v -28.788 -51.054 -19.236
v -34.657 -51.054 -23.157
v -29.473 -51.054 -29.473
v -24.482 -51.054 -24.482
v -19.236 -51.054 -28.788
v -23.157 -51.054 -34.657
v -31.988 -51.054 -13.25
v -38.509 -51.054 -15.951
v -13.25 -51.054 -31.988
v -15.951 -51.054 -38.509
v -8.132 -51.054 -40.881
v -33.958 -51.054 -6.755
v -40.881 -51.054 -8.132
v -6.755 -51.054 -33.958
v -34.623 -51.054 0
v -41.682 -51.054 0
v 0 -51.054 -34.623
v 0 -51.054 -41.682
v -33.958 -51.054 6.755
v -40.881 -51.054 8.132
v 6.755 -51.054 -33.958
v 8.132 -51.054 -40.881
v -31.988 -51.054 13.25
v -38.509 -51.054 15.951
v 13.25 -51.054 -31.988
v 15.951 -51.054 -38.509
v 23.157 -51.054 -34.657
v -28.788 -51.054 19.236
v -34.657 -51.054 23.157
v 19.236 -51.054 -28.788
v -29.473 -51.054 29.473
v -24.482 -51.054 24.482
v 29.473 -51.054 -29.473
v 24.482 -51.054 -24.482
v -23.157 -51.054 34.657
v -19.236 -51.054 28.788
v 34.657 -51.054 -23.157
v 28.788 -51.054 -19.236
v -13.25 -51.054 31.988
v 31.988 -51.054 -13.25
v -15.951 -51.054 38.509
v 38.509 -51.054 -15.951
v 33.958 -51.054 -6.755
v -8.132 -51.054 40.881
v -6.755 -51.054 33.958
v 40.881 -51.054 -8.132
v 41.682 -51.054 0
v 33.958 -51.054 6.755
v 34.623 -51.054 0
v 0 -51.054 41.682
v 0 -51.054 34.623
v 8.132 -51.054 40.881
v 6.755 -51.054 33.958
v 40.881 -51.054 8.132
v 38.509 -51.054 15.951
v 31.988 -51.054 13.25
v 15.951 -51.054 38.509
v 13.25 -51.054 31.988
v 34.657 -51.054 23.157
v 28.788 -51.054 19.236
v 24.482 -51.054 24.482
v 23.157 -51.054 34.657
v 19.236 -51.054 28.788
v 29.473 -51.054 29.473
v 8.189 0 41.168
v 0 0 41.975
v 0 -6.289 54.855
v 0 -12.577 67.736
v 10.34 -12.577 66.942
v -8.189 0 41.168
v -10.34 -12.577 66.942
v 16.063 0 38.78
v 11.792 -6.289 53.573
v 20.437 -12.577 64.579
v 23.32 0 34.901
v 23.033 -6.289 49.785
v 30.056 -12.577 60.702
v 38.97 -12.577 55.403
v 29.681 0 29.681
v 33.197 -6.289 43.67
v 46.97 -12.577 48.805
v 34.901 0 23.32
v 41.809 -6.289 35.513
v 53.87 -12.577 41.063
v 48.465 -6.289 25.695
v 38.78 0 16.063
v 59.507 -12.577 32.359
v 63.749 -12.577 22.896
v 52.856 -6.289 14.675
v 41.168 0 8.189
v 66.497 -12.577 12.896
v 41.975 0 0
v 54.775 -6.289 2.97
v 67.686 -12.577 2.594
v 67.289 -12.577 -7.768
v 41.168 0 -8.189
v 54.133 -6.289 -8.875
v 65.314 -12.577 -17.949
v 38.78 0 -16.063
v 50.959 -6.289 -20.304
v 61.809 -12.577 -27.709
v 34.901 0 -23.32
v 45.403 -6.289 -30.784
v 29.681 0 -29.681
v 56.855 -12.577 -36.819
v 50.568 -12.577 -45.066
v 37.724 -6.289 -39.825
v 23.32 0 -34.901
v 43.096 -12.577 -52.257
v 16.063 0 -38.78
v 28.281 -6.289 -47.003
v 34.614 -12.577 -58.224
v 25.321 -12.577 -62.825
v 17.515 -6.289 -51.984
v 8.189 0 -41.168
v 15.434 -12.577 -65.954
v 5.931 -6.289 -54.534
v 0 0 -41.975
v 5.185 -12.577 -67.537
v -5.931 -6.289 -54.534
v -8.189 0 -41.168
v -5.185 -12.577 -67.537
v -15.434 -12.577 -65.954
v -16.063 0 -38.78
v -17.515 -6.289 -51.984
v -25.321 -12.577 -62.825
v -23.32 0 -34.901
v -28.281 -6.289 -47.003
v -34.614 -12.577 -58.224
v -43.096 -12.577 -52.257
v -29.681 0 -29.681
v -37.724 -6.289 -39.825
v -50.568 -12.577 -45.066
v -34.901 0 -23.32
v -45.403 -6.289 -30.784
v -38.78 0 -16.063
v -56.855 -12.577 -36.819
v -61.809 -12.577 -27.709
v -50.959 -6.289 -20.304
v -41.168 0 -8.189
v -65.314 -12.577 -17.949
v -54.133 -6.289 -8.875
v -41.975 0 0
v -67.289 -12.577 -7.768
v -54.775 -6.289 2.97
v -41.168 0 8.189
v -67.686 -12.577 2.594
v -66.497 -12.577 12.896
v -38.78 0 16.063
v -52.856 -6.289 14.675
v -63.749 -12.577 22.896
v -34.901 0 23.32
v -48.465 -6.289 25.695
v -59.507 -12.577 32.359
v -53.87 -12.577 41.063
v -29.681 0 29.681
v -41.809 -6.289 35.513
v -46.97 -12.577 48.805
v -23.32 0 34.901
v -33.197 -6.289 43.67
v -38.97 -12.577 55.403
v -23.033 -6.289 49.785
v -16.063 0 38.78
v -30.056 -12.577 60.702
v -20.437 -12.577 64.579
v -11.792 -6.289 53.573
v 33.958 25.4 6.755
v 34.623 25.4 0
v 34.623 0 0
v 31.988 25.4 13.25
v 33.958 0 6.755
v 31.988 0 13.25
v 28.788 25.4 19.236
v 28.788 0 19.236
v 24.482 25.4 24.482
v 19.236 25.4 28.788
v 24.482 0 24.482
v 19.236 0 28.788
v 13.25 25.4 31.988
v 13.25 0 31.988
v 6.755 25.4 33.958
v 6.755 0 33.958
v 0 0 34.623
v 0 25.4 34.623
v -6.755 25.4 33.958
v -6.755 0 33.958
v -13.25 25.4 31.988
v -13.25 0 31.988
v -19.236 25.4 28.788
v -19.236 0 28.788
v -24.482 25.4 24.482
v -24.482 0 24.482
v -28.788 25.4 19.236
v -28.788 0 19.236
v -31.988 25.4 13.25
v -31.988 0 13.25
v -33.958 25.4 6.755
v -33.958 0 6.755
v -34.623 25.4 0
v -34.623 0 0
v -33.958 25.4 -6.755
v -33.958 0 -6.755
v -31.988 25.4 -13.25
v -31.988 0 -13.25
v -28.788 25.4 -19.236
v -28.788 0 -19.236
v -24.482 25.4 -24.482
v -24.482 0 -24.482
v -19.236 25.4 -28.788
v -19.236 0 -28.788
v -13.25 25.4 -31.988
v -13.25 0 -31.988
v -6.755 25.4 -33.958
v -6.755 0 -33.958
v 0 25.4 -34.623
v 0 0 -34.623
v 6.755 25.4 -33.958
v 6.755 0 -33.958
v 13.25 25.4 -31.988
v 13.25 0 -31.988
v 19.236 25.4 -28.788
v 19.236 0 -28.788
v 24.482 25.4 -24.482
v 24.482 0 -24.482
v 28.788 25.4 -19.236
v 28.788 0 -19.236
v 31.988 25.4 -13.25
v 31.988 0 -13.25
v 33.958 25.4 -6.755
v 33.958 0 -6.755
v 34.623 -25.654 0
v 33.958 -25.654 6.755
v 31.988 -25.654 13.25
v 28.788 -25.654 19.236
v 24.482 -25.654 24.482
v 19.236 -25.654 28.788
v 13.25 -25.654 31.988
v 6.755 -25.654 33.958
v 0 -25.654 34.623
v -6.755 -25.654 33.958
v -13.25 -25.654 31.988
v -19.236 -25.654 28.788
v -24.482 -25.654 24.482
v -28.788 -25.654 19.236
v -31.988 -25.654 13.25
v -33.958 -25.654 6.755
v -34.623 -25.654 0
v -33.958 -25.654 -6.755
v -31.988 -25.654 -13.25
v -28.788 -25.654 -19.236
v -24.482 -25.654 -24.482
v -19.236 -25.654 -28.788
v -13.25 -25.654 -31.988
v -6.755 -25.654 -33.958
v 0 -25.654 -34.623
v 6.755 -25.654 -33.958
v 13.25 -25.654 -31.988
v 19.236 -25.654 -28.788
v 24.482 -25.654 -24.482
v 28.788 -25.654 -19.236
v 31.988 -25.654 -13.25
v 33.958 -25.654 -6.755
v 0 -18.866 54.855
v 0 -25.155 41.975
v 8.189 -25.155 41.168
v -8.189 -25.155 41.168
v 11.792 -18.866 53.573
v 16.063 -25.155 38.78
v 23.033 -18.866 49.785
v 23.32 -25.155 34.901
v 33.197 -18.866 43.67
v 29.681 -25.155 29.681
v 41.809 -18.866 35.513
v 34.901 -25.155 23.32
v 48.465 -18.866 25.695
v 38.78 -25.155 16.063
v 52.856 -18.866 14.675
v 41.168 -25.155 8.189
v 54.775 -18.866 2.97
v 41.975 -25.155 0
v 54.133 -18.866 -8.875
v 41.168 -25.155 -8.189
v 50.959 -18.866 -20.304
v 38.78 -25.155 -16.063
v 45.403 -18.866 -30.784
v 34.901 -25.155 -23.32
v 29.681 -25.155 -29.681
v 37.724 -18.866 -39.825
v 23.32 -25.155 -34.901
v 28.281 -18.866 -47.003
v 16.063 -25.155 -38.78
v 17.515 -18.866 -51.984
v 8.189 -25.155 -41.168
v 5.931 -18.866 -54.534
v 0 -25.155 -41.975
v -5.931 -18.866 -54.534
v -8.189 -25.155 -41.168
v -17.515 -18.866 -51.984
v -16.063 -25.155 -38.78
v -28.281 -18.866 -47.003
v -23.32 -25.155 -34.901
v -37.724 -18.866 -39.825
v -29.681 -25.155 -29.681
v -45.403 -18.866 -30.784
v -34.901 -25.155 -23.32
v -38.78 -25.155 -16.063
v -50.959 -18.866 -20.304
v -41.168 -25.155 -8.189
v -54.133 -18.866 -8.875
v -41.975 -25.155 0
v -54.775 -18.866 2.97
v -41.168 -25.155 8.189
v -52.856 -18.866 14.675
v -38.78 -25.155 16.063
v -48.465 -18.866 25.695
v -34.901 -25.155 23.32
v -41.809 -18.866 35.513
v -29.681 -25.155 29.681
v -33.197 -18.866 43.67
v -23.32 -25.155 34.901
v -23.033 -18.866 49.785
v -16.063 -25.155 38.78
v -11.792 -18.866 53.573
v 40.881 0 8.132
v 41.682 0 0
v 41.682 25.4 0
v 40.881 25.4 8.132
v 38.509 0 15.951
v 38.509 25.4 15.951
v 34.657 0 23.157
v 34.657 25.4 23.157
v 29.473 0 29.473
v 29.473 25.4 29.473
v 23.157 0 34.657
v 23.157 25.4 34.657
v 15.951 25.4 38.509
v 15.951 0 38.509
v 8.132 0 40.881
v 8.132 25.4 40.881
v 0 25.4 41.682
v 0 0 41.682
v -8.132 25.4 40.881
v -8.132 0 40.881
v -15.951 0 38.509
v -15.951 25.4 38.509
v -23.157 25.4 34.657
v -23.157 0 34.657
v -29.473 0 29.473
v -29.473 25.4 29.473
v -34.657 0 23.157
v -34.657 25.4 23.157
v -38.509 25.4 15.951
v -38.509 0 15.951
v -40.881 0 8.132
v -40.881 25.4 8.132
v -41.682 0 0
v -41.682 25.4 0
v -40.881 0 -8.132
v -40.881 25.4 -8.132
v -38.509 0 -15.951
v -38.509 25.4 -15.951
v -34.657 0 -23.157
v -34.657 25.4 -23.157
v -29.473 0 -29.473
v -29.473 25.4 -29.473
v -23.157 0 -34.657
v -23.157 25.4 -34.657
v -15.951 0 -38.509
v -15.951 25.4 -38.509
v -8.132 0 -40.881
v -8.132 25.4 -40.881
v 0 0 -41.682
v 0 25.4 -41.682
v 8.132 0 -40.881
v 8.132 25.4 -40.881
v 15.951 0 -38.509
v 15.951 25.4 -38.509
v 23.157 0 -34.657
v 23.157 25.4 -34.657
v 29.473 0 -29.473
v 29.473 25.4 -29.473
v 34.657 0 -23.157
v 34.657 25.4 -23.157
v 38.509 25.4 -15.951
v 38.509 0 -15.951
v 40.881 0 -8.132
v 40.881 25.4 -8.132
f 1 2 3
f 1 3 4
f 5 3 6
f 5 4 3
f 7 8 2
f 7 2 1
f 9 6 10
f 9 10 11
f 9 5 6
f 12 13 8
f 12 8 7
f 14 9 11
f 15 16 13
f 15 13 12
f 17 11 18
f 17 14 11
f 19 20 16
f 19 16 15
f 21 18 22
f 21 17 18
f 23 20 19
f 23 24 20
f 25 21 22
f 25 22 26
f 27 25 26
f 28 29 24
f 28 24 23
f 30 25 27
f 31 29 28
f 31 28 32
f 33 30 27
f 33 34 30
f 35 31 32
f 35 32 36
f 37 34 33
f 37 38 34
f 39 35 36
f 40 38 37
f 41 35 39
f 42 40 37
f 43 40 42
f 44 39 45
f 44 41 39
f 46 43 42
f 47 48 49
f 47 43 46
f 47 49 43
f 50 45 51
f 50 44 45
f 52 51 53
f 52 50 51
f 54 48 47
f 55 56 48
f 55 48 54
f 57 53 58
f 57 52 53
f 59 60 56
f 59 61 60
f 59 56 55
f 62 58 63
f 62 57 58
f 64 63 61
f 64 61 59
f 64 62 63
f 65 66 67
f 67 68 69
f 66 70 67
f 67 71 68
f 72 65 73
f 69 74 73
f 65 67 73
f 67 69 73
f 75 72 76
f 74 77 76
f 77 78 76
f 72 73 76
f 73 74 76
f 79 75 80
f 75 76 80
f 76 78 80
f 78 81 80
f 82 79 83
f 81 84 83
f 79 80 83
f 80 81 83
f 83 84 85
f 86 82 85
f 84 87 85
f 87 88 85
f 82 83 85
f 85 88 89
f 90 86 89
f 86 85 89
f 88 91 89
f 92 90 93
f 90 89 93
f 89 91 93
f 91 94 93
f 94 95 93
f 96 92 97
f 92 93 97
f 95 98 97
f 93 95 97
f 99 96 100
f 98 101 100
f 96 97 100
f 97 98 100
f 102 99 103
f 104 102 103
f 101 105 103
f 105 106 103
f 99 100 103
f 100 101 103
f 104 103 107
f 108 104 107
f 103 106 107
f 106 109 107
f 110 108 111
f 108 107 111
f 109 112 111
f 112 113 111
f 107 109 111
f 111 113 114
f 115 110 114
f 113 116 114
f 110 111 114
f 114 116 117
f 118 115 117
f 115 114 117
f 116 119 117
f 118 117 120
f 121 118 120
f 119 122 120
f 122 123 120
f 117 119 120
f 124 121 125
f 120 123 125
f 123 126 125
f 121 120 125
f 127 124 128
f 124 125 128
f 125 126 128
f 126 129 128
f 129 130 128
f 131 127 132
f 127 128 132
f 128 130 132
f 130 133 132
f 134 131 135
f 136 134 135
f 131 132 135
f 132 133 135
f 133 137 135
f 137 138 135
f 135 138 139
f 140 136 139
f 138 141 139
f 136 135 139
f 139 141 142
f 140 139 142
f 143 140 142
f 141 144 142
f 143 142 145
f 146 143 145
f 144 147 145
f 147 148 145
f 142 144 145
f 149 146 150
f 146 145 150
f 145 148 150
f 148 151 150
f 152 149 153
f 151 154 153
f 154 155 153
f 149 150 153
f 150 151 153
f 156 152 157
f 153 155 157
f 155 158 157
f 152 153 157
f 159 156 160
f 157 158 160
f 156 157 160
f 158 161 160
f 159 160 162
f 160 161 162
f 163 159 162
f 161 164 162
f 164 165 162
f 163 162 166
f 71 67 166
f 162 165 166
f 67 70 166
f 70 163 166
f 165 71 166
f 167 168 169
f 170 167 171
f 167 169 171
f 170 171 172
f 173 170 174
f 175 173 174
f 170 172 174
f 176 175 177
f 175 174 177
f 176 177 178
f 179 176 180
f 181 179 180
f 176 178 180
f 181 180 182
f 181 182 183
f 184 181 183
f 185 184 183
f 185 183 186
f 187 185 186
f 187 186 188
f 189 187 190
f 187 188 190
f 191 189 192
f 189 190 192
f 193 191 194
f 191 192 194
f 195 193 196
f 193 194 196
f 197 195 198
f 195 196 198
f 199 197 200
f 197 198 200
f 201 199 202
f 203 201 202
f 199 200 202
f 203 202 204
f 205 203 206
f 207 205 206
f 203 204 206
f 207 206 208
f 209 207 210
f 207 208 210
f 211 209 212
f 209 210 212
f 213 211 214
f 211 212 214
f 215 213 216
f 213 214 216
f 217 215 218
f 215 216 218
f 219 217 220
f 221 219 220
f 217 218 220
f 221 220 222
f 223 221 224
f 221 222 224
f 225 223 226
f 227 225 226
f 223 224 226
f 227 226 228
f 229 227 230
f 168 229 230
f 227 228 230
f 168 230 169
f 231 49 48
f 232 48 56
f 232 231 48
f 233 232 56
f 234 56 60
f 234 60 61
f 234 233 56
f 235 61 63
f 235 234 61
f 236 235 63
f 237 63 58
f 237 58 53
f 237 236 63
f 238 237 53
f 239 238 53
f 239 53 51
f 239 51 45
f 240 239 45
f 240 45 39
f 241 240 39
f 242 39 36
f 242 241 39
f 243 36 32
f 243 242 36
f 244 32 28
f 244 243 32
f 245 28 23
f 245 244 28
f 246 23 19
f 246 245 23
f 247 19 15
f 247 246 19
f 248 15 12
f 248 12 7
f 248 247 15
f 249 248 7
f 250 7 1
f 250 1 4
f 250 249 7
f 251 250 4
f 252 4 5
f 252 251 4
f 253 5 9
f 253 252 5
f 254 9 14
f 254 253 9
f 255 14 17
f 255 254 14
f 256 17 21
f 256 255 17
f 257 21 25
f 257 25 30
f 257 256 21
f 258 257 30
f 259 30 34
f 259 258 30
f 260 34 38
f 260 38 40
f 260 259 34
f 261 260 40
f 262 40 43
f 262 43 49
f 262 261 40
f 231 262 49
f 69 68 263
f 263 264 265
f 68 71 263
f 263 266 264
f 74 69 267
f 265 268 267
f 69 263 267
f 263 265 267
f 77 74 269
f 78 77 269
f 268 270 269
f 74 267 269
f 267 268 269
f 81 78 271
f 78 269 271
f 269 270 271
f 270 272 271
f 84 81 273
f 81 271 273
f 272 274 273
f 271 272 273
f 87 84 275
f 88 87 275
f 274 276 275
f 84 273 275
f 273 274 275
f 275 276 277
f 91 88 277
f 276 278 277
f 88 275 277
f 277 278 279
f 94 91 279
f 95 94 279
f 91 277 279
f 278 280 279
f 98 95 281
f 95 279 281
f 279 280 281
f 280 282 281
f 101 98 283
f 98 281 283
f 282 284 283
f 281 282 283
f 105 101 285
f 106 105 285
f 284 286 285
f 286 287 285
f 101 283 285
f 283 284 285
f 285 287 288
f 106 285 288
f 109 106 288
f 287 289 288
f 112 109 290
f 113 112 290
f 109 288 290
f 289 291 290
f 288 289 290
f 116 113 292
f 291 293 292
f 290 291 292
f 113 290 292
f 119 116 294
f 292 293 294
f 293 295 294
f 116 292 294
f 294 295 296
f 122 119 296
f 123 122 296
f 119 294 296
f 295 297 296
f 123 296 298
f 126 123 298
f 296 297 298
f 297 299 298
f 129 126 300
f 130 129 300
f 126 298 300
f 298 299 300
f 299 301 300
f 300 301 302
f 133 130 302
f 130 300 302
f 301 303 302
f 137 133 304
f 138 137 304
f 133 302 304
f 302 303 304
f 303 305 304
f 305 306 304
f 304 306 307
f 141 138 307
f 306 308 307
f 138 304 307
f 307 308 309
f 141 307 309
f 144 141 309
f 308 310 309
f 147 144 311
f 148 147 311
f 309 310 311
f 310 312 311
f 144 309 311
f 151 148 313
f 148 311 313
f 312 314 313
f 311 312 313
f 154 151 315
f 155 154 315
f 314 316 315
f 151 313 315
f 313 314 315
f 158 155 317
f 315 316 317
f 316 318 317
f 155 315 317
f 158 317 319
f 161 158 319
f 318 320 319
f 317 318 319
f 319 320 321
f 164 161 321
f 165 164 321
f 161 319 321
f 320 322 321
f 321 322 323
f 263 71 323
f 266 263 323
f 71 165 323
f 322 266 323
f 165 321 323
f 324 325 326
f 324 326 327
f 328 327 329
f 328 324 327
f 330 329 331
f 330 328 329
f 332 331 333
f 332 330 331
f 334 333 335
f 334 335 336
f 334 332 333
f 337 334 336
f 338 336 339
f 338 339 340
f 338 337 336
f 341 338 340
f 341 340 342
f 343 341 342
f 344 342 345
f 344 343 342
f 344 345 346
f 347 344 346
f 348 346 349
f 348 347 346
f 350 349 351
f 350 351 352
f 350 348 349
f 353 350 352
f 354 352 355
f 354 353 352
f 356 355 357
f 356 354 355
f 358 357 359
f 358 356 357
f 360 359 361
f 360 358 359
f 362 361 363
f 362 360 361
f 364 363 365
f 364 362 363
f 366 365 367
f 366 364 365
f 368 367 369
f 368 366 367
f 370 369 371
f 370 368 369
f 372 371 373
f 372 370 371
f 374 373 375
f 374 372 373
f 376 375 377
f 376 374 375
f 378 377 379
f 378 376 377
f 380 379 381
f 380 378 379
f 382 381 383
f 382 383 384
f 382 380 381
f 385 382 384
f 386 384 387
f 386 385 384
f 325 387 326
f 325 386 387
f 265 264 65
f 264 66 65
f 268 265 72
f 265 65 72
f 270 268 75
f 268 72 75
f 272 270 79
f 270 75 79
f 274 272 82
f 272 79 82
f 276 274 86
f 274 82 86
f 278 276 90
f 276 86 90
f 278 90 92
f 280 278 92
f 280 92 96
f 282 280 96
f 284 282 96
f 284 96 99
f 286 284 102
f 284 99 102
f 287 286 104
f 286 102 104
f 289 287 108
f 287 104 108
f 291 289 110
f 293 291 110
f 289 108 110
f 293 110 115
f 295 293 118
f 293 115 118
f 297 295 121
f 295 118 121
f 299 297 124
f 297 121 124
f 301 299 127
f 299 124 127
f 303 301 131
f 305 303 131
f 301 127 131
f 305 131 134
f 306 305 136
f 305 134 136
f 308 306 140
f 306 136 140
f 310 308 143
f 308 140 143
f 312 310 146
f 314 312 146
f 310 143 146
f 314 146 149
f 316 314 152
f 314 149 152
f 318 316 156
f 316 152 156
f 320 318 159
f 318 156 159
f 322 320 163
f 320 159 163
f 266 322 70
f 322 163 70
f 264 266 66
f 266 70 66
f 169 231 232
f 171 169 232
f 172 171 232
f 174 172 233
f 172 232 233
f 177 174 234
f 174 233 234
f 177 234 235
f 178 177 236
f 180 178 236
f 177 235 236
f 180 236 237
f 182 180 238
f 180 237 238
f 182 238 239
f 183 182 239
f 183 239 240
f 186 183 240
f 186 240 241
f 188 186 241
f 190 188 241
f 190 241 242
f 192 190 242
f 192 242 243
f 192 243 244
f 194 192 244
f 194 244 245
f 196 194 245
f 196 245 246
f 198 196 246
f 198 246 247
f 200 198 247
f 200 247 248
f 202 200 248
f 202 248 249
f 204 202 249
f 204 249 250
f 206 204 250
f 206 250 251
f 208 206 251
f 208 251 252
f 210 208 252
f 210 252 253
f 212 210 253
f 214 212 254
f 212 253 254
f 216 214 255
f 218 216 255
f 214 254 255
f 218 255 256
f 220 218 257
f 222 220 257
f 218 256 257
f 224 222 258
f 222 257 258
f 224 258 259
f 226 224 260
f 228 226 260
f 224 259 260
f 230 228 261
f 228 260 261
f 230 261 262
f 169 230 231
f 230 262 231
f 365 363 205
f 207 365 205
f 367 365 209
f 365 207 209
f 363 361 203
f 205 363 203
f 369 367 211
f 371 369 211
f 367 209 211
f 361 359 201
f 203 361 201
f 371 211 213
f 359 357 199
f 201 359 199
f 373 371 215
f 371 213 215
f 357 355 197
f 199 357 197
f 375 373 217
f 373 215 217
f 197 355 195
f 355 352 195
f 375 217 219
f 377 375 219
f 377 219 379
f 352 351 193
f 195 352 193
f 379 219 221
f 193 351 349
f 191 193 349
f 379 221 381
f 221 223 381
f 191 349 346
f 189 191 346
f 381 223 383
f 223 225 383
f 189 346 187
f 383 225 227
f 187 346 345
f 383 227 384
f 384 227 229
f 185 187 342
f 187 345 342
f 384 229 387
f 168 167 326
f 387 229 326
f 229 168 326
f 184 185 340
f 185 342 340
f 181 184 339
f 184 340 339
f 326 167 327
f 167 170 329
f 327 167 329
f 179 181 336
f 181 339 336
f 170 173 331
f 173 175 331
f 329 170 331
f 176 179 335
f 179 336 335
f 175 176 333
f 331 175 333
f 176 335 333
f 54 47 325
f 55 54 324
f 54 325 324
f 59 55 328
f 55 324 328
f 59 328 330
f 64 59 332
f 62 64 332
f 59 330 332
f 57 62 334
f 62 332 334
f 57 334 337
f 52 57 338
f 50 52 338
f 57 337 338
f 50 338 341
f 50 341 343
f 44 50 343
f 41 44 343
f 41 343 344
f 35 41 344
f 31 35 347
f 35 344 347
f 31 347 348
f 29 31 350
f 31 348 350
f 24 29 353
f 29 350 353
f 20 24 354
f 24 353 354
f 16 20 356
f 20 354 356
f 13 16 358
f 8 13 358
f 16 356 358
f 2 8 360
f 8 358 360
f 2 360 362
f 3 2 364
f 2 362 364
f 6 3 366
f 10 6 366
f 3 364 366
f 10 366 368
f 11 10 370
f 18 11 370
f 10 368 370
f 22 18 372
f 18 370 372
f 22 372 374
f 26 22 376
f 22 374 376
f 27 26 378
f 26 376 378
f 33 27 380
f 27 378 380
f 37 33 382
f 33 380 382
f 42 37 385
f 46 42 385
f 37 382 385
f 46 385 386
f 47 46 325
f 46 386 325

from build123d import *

# Parameters (mm, degrees)
F0_R     = 41.6817896179
F1_DEPTH = 25.654
F2_R     = 34.6231350924
F3_DEPTH = 155.448
F6_DEPTH = 25.4
F7_DEPTH = 25.4


with BuildPart() as f1:
    # F0 (on Front) → F1 (new body)
    with BuildSketch(Plane.XZ):
        Circle(F0_R)
    extrude(amount=F1_DEPTH)

    # F2 (on face) → F3 (cut)
    with BuildSketch(Plane.XZ.offset(25.654)):
        Circle(F2_R)
    extrude(amount=-F3_DEPTH, mode=Mode.SUBTRACT)

    # F6 (add): a face of the model
    f6_faces = [f1.faces().sort_by_distance(p)[0] for p in [
        (-40.5028505742, -25.654, 0),
    ]]
    extrude(f6_faces, amount=F6_DEPTH)

    # F7 (add): a face of the model
    f7_faces = [f1.faces().sort_by_distance(p)[0] for p in [
        (-40.5028505742, 0, 0),
    ]]
    extrude(f7_faces, amount=F7_DEPTH)


with BuildPart() as f5:
    # F4 (on Right) → F5 (revolve)
    with BuildSketch(Plane.YZ):
        Polygon((-25.1546557993, 41.9749431312), (0, 41.9749431312), (-12.5773278996, 67.7357390523), align=None)
    revolve(axis=Axis((0, 0, 0), (0, 1, 0)))


solid = Compound([f1.part, f5.part])
